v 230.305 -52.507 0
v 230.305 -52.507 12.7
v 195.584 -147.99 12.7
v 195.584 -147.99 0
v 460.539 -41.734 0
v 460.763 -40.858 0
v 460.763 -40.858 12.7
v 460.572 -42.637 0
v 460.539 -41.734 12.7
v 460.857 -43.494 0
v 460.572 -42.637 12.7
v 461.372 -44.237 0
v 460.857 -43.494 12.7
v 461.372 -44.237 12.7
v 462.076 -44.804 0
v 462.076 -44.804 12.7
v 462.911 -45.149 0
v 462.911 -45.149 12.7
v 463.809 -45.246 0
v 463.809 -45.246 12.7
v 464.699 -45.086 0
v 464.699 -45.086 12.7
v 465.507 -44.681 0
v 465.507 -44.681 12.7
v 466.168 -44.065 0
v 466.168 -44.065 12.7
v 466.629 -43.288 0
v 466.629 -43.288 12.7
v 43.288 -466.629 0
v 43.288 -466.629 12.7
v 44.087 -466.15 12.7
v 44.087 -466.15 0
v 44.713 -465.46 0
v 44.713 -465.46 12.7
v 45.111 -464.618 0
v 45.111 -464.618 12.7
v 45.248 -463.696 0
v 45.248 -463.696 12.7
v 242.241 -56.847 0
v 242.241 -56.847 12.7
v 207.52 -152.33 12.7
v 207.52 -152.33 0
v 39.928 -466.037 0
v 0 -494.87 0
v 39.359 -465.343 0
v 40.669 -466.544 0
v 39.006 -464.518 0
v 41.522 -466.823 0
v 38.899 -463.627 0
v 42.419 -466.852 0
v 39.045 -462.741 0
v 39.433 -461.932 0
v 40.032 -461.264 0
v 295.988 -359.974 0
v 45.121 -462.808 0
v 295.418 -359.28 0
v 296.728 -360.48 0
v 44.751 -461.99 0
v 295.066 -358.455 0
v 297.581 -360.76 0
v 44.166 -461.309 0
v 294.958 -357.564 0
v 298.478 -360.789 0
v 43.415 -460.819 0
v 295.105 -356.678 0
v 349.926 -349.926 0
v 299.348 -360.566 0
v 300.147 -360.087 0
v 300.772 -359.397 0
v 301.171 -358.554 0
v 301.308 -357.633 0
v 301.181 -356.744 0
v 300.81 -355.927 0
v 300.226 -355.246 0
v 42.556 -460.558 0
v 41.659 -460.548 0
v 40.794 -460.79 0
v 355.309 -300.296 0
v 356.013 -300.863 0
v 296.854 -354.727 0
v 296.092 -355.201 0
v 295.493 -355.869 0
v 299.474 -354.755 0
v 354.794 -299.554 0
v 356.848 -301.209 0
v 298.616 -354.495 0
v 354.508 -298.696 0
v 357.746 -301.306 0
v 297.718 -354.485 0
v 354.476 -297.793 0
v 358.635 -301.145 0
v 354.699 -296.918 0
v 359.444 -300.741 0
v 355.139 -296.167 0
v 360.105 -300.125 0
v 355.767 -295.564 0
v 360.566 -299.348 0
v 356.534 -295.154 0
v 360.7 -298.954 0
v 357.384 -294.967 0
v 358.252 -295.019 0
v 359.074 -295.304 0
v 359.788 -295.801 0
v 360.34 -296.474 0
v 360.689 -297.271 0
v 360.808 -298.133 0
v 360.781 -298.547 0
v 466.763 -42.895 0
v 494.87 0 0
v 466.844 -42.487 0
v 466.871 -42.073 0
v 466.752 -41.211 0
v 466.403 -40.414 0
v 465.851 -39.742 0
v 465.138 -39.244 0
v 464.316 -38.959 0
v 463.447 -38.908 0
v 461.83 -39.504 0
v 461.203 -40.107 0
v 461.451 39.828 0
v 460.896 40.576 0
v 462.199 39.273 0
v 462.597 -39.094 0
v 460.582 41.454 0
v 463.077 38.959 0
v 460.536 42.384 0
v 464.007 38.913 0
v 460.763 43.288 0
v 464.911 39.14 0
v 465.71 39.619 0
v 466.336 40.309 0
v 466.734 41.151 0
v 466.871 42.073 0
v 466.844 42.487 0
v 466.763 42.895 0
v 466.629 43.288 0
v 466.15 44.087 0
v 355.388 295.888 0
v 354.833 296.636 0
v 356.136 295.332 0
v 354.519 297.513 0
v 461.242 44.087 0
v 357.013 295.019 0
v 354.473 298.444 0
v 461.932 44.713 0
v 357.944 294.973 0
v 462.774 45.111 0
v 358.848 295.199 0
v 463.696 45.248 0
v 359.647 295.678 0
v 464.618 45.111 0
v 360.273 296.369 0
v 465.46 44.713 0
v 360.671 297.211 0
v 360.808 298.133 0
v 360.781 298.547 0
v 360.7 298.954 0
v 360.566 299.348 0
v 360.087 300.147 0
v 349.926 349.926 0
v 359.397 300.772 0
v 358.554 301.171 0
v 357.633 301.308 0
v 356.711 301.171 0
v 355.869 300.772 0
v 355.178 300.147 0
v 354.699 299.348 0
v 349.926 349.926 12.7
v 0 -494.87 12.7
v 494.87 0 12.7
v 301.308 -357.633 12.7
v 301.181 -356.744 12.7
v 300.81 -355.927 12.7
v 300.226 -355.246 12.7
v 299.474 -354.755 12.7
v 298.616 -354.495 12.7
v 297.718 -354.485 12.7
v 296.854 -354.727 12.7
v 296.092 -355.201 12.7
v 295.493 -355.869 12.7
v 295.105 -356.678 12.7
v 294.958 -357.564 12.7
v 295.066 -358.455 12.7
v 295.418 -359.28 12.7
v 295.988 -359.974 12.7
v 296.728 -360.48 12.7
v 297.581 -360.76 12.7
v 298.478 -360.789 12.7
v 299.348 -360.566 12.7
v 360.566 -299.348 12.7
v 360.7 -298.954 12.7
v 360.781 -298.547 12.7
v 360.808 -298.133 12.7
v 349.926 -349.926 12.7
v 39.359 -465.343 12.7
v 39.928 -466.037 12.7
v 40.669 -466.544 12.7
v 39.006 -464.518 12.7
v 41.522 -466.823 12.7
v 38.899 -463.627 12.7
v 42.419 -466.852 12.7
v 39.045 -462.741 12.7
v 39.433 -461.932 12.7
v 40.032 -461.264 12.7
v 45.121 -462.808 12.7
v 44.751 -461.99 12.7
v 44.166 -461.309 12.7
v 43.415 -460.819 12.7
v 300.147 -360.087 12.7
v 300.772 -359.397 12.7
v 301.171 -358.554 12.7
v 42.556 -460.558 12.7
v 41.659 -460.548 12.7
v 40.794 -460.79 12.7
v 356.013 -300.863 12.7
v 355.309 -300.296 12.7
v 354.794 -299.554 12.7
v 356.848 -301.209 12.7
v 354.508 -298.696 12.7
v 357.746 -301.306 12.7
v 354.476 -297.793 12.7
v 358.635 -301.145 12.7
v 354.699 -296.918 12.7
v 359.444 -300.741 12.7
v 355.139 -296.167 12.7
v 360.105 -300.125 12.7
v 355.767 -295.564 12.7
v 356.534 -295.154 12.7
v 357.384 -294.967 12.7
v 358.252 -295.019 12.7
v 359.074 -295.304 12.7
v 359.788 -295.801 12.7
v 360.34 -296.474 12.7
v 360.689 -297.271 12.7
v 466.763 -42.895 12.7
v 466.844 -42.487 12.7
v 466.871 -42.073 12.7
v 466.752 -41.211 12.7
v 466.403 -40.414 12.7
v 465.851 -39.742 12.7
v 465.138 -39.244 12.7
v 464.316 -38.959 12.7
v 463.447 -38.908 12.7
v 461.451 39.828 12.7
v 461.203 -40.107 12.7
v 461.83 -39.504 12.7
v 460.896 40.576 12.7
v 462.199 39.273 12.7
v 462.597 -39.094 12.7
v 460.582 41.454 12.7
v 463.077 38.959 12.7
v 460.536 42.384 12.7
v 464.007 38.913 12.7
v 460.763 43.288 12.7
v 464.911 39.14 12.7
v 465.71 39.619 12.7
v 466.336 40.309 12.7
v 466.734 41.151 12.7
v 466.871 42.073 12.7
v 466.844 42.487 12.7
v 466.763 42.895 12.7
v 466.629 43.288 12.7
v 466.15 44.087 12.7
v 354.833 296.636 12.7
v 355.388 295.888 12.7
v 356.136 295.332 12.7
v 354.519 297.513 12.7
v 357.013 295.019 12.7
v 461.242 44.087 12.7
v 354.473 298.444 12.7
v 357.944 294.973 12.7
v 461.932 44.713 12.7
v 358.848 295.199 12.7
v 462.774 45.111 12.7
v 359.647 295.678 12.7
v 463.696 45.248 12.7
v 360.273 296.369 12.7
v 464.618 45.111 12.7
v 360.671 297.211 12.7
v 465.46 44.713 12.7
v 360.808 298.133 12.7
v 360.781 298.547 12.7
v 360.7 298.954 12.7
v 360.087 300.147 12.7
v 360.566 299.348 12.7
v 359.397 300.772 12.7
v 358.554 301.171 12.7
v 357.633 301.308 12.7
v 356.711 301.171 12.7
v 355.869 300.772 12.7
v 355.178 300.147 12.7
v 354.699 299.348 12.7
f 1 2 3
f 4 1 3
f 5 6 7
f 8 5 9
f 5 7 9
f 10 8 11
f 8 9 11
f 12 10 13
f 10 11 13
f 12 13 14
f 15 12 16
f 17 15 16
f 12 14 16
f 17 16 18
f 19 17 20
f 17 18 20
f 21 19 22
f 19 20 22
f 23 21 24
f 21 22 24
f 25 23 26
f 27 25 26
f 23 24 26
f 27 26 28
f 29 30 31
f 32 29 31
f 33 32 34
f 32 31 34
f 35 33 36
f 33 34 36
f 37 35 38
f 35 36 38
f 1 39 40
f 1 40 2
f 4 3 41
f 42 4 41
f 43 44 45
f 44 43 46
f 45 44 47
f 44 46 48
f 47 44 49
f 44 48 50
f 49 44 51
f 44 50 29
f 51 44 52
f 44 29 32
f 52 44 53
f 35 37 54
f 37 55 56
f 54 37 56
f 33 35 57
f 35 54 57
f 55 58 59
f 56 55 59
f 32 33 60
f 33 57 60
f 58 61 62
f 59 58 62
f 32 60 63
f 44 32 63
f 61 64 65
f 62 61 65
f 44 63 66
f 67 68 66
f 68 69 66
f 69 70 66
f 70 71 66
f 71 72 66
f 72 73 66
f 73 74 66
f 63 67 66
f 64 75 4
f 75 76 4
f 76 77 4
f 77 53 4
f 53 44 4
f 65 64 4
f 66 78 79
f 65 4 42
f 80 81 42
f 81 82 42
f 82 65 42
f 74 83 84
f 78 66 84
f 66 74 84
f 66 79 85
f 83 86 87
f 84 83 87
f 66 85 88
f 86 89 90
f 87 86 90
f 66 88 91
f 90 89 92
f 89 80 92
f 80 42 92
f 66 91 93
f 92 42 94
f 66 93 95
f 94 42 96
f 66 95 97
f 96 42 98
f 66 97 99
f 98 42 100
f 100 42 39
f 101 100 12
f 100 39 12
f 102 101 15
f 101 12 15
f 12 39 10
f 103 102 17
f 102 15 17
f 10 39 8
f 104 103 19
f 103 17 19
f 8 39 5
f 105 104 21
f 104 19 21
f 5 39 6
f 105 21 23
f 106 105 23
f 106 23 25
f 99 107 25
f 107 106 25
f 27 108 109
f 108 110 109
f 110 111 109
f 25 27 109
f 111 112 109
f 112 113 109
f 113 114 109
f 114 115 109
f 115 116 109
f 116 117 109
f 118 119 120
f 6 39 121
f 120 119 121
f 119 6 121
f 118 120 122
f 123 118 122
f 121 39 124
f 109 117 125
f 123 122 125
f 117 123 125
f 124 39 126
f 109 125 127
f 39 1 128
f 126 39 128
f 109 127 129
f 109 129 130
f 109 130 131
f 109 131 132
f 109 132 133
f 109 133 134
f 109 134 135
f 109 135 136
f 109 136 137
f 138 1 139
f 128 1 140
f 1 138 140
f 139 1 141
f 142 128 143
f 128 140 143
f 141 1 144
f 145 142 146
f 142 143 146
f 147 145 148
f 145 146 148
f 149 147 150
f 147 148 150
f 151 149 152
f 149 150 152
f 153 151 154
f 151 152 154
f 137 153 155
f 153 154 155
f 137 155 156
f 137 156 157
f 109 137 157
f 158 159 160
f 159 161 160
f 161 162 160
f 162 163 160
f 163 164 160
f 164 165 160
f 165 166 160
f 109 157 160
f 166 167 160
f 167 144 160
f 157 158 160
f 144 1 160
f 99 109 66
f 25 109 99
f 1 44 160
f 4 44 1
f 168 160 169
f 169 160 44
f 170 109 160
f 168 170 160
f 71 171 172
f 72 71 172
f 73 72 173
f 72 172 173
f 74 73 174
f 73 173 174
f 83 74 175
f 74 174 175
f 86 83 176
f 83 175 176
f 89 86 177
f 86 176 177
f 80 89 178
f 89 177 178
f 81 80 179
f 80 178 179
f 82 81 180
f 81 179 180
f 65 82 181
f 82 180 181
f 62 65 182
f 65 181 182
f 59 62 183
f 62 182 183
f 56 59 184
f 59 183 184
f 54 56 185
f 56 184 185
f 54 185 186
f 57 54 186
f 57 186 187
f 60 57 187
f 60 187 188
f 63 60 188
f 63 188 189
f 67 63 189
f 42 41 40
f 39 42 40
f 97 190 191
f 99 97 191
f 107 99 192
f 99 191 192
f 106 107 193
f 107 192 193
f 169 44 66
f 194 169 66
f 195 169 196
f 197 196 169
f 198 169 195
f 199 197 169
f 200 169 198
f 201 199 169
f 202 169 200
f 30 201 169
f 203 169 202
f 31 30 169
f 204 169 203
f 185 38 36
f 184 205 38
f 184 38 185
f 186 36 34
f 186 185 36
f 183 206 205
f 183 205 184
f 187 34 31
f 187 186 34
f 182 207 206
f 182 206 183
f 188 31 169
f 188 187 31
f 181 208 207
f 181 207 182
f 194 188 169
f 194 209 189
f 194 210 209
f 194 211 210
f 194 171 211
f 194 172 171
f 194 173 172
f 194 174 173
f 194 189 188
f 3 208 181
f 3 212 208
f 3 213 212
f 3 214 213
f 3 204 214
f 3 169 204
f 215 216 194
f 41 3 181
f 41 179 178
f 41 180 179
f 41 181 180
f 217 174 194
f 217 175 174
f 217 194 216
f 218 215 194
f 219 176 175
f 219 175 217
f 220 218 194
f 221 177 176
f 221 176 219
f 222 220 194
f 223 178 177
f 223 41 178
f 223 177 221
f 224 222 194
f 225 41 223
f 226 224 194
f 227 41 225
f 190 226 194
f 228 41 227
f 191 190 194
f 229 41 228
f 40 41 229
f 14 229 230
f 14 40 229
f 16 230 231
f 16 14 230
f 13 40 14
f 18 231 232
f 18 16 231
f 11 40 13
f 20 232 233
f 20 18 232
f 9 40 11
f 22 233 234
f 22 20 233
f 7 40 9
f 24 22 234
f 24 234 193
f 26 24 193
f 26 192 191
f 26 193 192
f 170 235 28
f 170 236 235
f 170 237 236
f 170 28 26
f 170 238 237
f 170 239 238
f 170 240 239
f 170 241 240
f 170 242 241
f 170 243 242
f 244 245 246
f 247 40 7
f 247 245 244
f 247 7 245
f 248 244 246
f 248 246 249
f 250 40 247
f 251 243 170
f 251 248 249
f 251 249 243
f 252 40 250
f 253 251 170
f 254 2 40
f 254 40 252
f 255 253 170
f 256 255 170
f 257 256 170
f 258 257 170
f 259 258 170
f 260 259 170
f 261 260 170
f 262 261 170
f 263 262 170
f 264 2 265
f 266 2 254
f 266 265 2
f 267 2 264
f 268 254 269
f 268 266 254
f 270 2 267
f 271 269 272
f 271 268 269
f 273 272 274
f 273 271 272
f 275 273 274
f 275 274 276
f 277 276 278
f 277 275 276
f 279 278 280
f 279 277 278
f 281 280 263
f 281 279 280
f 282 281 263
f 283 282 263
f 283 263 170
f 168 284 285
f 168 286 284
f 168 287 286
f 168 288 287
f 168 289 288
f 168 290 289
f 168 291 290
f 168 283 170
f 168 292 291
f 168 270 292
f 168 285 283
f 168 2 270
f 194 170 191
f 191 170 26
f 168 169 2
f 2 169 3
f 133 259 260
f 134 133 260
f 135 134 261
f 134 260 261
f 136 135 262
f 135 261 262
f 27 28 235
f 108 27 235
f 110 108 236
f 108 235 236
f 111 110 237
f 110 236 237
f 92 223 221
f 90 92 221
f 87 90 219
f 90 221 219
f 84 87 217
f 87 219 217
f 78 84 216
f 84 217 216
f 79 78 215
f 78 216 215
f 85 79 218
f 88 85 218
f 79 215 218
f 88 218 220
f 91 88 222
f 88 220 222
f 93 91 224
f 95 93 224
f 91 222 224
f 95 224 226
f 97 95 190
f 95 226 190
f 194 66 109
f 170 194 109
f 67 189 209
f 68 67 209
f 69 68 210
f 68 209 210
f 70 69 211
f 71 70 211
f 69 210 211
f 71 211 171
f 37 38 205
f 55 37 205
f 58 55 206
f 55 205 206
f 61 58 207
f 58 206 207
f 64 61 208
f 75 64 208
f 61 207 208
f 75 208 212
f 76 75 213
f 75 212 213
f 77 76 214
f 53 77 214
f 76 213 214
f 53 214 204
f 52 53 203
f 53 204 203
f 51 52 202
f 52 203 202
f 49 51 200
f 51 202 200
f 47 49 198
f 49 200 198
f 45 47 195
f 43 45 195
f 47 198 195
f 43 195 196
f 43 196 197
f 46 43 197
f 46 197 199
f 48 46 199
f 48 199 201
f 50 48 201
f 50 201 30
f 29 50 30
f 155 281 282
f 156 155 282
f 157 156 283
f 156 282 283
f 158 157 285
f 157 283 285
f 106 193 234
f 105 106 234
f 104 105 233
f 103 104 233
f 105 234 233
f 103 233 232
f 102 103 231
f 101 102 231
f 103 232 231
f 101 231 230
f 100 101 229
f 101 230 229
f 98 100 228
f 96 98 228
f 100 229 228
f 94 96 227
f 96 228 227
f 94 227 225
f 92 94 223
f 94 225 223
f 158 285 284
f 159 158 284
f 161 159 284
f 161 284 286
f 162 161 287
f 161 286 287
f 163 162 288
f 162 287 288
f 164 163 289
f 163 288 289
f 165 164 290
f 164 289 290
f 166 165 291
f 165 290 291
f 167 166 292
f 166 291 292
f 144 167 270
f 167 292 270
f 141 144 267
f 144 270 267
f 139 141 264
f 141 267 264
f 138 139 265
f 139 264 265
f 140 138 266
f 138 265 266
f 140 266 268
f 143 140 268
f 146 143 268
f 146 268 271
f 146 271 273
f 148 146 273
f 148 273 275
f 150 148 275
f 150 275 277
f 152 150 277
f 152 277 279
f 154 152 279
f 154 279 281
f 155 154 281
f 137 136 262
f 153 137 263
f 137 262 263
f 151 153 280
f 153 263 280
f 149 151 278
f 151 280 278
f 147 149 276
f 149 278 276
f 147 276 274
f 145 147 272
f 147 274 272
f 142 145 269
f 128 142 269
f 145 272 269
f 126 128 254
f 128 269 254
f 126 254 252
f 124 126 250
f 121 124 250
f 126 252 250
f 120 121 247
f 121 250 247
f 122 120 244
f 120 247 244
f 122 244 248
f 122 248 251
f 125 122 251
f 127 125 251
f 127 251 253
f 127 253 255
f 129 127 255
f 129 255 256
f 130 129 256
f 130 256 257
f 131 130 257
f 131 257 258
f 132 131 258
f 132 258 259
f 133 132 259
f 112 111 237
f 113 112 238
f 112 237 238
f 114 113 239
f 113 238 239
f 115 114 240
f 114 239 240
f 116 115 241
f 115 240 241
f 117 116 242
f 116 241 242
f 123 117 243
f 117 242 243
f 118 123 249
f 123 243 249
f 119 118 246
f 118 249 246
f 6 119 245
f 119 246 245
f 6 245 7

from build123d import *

# Parameters (mm, degrees)
F1_DEPTH = 12.7
F3_DEPTH = 12.701
F5_DEPTH = 25.4


with BuildPart() as f1:
    # F0 (on Top) → F1 (new body)
    with BuildSketch(Plane.XY):
        Polygon((349.925731, -349.925731), (494.869714, 0), (349.925731, 349.925731), (0, -494.869714), align=None)
    extrude(amount=F1_DEPTH)

    # F2 (on face) → F3 (cut, through all)
    with BuildSketch(Plane.XY.offset(12.7)):
        with BuildLine():
            ThreePointArc((43.288021, -466.629443), (44.712917, -465.460061), (45.248001, -463.696126))
            ThreePointArc((45.248001, -463.696126), (39.433085, -461.93219), (43.288021, -466.629443))
        make_face()
        with BuildLine():
            ThreePointArc((299.347591, -360.566096), (300.772487, -359.396714), (301.307571, -357.632779))
            ThreePointArc((301.307571, -357.632779), (295.492655, -355.868843), (299.347591, -360.566096))
        make_face()
        with BuildLine():
            ThreePointArc((360.566096, -299.347591), (360.746772, -298.751982), (360.807779, -298.132571))
            ThreePointArc((360.807779, -298.132571), (358.252191, -295.018577), (354.699461, -296.917551))
            Line((354.699461, -296.917551), (357.632779, -298.132571))
            Line((357.632779, -298.132571), (360.566096, -299.347591))
        make_face()
        with BuildLine():
            Line((357.632779, -298.132571), (354.699461, -296.917551))
            ThreePointArc((354.699461, -296.917551), (356.417759, -301.065888), (360.566096, -299.347591))
            Line((360.566096, -299.347591), (357.632779, -298.132571))
        make_face()
        with BuildLine():
            ThreePointArc((466.629443, -43.288021), (466.810119, -42.692412), (466.871126, -42.073001))
            ThreePointArc((466.871126, -42.073001), (464.315537, -38.959007), (460.762808, -40.857981))
            Line((460.762808, -40.857981), (463.696126, -42.073001))
            Line((463.696126, -42.073001), (466.629443, -43.288021))
        make_face()
        with BuildLine():
            Line((463.696126, -42.073001), (460.762808, -40.857981))
            ThreePointArc((460.762808, -40.857981), (462.481106, -45.006318), (466.629443, -43.288021))
            Line((466.629443, -43.288021), (463.696126, -42.073001))
        make_face()
        with BuildLine():
            ThreePointArc((466.629443, 43.288021), (460.582132, 41.453589), (466.871126, 42.073001))
            ThreePointArc((466.871126, 42.073001), (466.810119, 42.692412), (466.629443, 43.288021))
        make_face()
        with BuildLine():
            ThreePointArc((360.566096, 299.347591), (354.518786, 297.513159), (360.807779, 298.132571))
            ThreePointArc((360.807779, 298.132571), (360.746772, 298.751982), (360.566096, 299.347591))
        make_face()
    extrude(amount=-F3_DEPTH, mode=Mode.SUBTRACT)

    # F4 (on face) → F5 (cut)
    with BuildSketch(Plane.XY.offset(12.7)):
        Polygon((230.305284, -52.50727), (195.584189, -147.990282), (207.519565, -152.330419), (242.24066, -56.847407), align=None)
    extrude(amount=-F5_DEPTH, mode=Mode.SUBTRACT)


solid = f1.part
